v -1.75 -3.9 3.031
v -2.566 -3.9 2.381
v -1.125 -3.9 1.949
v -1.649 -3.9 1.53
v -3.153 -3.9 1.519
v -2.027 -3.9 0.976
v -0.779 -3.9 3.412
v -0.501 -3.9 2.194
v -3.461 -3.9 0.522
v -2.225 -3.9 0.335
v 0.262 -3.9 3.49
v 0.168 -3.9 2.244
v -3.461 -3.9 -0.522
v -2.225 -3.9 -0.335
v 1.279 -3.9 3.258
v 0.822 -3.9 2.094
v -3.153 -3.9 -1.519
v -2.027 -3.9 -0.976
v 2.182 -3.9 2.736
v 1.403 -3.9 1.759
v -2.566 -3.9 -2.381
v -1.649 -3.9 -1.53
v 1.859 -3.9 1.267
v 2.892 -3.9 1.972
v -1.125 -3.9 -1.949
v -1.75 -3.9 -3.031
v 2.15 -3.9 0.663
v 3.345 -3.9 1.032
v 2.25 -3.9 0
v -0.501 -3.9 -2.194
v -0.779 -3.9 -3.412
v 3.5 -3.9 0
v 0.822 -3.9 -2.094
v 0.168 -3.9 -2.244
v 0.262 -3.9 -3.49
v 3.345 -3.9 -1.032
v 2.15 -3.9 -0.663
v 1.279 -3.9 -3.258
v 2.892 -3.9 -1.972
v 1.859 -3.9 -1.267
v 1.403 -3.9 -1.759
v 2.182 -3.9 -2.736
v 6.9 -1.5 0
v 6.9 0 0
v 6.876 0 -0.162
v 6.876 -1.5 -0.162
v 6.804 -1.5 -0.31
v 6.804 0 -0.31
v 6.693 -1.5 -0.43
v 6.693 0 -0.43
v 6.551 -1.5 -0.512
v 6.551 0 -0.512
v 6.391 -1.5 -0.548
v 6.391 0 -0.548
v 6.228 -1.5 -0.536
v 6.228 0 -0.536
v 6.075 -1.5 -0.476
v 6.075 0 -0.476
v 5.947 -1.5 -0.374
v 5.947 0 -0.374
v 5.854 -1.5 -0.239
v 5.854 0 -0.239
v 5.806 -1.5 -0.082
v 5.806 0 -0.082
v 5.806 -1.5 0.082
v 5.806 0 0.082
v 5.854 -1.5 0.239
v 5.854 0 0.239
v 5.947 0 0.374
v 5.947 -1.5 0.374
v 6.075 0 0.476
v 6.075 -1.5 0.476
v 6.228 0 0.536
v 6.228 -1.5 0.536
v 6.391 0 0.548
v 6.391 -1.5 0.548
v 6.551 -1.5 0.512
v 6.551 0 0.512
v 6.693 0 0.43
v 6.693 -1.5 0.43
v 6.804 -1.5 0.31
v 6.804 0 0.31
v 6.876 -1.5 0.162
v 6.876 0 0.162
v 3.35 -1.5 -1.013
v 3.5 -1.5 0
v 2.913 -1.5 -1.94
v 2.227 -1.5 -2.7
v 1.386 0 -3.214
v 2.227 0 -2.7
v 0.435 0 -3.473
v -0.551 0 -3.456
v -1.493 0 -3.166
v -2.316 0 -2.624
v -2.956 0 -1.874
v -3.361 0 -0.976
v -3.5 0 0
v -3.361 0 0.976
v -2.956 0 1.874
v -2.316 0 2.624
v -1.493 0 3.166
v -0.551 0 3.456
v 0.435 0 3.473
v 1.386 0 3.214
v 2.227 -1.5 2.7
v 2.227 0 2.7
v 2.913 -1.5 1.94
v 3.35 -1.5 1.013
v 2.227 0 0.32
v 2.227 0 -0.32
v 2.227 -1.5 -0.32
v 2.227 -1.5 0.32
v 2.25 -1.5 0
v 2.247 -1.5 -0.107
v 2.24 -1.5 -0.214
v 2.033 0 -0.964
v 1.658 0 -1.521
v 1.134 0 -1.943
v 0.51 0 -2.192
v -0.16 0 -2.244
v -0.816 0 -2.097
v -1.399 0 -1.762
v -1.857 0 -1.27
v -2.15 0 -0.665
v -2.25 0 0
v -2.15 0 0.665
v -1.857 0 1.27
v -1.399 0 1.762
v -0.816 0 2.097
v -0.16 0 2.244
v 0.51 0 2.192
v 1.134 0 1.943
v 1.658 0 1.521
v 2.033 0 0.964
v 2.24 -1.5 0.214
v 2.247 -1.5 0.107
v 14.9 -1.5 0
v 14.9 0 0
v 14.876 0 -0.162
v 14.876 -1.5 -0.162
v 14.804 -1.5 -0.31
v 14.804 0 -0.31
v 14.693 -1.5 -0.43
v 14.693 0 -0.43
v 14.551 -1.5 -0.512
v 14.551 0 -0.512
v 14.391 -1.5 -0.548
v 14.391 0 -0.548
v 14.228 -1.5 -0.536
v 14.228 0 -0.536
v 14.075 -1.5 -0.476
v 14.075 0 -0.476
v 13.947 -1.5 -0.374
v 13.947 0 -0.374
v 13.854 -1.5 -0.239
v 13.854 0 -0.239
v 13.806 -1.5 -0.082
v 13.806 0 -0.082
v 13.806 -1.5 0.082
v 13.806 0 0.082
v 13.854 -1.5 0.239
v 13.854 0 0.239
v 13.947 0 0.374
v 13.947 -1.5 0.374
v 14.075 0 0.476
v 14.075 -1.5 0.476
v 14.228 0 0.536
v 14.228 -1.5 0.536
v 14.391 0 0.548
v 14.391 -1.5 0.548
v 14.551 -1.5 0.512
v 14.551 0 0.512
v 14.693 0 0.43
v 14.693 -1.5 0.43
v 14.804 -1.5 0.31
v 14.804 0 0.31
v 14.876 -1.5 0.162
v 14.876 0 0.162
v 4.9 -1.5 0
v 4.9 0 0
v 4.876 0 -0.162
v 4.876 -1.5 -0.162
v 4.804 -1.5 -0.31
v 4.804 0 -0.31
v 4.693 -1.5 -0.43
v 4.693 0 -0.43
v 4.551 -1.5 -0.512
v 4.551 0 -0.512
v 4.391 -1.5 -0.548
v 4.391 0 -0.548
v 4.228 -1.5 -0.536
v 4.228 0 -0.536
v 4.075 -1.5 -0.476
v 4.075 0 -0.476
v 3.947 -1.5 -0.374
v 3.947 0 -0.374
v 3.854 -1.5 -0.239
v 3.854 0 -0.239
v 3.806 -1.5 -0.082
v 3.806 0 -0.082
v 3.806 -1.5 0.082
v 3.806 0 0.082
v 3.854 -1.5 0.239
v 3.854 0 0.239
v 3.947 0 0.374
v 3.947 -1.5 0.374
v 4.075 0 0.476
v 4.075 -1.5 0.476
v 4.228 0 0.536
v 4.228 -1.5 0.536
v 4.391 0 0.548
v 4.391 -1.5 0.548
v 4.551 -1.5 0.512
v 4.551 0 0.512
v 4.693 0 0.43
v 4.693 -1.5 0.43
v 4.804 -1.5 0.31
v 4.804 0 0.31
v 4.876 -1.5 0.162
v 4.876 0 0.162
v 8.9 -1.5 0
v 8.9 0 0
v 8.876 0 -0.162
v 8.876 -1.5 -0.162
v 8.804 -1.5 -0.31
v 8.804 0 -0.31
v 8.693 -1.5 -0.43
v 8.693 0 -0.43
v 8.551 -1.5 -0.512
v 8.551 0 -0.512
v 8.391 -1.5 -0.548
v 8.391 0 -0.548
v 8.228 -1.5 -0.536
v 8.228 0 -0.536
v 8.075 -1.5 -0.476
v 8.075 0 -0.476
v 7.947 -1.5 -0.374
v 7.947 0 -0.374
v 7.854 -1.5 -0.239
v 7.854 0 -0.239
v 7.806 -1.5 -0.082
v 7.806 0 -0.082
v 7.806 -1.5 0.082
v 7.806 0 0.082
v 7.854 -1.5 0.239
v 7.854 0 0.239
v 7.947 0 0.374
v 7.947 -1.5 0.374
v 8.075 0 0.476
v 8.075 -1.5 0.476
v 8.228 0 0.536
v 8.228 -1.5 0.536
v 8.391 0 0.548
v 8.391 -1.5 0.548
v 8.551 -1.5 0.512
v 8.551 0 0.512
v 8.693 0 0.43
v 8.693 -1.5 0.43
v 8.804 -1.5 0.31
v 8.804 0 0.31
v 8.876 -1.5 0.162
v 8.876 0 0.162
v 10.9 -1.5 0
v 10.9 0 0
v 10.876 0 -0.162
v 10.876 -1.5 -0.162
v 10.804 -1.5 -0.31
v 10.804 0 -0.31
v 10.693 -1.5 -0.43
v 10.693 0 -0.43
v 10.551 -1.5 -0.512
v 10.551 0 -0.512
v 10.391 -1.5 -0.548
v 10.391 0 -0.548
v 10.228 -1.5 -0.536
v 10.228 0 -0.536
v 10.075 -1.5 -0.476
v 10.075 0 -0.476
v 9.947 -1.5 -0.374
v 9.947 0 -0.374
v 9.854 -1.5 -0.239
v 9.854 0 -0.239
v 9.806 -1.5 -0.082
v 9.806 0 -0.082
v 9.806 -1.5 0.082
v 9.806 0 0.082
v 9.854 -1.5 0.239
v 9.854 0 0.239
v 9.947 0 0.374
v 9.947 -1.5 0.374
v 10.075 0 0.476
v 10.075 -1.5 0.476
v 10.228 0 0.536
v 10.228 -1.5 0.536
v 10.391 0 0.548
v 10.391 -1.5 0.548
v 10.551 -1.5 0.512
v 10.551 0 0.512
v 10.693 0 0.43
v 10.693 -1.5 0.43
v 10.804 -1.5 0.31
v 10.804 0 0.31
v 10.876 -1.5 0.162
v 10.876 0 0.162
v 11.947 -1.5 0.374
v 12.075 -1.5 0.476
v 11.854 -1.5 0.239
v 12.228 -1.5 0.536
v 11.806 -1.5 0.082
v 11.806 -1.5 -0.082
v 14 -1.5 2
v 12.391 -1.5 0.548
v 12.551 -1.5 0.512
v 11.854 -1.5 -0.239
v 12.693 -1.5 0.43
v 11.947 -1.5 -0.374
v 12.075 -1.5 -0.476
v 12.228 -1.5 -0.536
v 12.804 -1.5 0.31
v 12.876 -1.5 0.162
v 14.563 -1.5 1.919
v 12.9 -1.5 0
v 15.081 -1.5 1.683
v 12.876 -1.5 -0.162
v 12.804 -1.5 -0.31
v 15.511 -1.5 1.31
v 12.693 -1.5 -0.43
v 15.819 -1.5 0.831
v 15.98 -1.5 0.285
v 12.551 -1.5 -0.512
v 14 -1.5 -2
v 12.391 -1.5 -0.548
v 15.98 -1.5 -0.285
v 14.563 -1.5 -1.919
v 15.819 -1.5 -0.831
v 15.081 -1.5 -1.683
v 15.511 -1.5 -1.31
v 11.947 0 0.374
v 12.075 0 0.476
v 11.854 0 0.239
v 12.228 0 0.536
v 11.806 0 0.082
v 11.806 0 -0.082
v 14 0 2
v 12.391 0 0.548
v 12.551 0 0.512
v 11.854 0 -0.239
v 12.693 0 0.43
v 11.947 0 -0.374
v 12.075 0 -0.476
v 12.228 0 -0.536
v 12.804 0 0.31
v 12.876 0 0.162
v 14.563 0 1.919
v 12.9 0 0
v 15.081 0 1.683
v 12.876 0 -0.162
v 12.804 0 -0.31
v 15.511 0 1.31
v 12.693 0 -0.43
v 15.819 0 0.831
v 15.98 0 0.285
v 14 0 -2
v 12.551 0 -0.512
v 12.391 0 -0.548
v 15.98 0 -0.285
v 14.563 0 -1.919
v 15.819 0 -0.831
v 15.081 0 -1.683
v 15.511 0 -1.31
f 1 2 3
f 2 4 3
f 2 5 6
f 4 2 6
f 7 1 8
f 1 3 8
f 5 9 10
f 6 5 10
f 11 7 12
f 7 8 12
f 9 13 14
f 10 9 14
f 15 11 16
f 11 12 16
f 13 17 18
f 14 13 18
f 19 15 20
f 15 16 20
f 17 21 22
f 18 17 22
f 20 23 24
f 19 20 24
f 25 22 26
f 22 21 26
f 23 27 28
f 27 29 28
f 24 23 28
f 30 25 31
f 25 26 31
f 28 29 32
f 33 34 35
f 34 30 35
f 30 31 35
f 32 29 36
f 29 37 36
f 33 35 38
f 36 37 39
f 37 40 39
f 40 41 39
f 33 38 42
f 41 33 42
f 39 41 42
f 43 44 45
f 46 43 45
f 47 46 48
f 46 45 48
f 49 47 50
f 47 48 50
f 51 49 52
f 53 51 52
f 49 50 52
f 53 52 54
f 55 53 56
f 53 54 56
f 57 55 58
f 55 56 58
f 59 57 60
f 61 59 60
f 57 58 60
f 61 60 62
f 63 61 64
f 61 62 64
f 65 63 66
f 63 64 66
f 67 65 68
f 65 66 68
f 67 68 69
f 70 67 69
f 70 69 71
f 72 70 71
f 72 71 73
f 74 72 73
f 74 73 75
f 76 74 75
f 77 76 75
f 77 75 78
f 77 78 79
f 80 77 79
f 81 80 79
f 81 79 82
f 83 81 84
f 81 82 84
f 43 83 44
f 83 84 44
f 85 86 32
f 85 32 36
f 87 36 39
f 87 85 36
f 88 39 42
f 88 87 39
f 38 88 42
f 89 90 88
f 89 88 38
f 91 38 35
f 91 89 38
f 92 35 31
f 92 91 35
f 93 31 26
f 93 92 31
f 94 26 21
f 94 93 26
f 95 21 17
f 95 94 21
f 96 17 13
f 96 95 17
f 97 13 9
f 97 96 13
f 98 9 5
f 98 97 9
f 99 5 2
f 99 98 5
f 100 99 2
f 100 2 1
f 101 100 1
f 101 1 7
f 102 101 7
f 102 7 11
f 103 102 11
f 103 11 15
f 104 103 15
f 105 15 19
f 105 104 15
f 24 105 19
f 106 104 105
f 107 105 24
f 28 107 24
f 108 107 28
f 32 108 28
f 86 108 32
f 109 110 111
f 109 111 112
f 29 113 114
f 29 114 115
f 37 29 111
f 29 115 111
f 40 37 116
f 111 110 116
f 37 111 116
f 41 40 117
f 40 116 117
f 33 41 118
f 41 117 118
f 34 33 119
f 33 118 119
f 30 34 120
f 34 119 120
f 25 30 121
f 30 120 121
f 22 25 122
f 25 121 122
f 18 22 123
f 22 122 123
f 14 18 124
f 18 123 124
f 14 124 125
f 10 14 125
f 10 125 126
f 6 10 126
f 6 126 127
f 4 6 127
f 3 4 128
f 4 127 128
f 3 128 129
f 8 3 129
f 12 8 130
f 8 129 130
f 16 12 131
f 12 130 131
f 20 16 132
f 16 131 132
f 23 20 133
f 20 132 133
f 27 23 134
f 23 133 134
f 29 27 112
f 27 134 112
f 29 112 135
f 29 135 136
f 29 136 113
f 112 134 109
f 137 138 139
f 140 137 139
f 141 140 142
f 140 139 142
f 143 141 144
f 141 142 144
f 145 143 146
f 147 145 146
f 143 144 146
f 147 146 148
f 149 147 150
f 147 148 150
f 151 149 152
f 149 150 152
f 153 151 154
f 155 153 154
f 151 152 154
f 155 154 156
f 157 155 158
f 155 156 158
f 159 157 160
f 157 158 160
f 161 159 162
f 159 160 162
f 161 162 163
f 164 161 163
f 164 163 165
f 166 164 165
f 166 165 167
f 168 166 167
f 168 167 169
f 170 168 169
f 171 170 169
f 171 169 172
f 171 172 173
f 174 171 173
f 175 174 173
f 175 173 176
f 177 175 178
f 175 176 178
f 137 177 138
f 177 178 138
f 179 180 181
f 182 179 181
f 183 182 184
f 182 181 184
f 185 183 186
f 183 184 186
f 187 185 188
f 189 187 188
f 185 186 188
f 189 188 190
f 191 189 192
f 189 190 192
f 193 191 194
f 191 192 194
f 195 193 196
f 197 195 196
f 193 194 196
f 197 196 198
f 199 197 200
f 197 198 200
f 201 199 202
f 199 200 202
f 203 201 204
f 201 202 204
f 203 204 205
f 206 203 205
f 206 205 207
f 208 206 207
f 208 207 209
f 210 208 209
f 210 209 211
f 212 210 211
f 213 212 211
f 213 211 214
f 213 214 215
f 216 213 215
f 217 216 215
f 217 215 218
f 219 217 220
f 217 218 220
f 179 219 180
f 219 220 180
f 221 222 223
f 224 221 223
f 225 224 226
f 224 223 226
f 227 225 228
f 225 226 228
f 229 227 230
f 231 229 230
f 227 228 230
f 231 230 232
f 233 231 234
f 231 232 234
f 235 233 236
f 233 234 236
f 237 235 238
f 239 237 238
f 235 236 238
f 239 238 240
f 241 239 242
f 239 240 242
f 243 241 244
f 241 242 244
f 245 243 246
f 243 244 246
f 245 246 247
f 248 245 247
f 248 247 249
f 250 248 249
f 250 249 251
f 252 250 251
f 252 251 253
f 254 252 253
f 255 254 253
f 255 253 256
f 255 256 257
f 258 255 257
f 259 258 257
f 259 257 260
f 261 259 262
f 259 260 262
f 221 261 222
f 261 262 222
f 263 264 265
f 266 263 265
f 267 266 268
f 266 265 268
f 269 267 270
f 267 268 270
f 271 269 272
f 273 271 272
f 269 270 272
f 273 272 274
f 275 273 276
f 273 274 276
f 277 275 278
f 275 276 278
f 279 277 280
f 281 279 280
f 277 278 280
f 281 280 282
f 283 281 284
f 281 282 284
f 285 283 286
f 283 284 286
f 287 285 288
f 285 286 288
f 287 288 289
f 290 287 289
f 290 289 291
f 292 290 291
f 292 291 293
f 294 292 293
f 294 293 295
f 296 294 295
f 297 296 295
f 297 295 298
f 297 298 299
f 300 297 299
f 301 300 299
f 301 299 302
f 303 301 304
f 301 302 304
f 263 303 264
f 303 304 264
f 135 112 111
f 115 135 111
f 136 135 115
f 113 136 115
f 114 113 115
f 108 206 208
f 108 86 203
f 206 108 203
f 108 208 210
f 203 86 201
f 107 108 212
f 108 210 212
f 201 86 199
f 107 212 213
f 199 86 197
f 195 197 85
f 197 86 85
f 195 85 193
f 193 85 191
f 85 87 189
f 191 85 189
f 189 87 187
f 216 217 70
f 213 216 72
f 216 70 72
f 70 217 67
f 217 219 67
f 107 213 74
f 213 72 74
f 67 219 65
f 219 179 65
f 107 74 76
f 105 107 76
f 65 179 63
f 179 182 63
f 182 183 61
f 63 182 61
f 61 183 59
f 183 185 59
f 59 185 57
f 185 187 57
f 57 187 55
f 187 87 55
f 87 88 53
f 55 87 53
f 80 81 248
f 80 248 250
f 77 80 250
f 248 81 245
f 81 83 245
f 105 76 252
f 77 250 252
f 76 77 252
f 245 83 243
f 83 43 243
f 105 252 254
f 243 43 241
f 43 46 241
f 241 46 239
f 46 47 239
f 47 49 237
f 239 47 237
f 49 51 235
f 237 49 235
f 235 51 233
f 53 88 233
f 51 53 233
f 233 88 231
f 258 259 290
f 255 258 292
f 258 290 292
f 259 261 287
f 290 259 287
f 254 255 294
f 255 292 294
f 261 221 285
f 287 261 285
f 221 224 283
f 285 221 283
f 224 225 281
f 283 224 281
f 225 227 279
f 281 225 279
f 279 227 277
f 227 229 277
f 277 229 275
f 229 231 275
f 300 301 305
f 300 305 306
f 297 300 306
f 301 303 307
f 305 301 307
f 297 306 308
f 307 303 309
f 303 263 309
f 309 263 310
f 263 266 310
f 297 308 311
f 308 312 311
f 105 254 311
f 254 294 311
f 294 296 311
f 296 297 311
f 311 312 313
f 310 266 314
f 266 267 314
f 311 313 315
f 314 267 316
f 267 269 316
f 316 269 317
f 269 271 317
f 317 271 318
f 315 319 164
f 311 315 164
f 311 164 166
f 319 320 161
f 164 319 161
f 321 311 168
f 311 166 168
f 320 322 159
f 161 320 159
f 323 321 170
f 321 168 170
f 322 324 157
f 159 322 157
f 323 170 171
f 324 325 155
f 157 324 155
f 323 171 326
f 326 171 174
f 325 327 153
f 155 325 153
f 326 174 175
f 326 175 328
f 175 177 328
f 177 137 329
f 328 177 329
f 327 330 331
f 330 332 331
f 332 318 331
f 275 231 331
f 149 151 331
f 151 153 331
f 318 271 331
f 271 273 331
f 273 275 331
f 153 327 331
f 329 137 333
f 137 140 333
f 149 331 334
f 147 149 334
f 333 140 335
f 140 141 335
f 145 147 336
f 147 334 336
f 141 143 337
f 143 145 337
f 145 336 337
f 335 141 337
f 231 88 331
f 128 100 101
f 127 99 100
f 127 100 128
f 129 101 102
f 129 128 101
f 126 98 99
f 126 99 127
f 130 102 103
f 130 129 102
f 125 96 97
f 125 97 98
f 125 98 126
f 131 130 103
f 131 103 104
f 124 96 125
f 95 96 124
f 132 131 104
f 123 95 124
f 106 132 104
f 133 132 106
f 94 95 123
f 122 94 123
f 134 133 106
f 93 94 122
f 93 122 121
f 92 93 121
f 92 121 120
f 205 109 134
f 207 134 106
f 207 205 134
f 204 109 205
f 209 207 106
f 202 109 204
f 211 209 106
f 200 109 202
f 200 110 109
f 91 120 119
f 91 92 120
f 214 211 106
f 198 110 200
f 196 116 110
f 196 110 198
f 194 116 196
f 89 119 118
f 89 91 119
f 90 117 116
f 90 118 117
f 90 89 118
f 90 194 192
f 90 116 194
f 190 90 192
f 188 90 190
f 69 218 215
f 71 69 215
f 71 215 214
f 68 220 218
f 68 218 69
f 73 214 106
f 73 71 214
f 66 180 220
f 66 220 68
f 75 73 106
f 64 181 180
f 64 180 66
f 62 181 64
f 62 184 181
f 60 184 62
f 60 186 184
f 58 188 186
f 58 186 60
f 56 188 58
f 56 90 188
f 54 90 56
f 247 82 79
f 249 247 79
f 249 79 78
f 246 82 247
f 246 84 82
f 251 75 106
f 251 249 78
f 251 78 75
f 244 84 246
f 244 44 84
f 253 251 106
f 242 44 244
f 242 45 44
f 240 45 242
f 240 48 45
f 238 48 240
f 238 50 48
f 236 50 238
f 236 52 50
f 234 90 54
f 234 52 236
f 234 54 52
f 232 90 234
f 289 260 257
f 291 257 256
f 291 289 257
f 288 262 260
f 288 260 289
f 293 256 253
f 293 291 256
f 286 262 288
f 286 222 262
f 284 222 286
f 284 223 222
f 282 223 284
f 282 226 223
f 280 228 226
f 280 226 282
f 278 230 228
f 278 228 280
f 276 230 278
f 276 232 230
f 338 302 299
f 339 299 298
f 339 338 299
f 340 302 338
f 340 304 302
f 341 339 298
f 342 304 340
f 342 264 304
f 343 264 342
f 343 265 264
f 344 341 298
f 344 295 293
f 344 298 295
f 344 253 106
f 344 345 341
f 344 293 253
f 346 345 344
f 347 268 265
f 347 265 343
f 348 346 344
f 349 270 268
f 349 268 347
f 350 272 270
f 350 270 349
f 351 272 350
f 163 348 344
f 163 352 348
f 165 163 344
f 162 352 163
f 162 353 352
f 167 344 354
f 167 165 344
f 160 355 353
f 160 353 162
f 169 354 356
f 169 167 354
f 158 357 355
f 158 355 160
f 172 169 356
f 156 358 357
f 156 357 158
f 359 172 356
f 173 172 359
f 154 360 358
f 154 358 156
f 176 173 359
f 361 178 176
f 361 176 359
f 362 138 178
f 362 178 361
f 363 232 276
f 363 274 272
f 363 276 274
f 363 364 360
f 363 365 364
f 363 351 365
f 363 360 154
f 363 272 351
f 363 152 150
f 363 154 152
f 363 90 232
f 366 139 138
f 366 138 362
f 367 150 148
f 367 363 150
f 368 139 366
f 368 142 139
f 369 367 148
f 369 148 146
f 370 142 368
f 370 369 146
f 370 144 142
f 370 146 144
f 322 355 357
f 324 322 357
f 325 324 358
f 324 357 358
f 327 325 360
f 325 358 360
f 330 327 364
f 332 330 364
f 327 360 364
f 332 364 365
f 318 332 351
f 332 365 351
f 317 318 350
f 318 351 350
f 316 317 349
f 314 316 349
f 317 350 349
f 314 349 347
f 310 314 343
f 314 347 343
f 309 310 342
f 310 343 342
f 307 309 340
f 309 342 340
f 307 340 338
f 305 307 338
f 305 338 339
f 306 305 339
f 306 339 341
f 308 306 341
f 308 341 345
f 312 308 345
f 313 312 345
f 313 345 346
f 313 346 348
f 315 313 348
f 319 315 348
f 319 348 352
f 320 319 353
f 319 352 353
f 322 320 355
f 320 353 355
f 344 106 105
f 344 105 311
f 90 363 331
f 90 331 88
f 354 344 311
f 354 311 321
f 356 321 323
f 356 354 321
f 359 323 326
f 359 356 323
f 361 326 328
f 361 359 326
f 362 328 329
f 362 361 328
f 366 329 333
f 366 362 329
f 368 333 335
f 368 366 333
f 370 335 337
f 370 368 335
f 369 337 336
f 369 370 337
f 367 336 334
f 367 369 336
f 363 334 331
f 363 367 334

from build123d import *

# Parameters (mm, degrees)
SKETCH1_R           = 3.5
SKETCH1_R_2         = 2.25
BOSS_EXTRUDE1_DEPTH = 3.9
SKETCH2_R           = 2
BOSS_EXTRUDE2_DEPTH = 1.5
SKETCH3_R           = 0.55
CUT_EXTRUDE1_DEPTH  = 1.5
LPATTERN1_COUNT     = 6
LPATTERN1_PITCH     = 2


with BuildPart() as part:
    # Sketch1 → Boss-Extrude1 (new body)
    with BuildSketch(Plane(origin=(0, 0, 0), x_dir=(1, 0, 0), z_dir=(0, 1, 0))):
        Circle(SKETCH1_R)
        Circle(SKETCH1_R_2, mode=Mode.SUBTRACT)
    extrude(amount=-BOSS_EXTRUDE1_DEPTH)

    # Sketch2 → Boss-Extrude2 (add)
    with BuildSketch(Plane(origin=(0, 0, 0), x_dir=(1, 0, 0), z_dir=(0, 1, 0))):
        with BuildLine():
            ThreePointArc((14, -2), (12, 0), (14, 2))
            Line((14, 2), (2.227105745, 2.7))
            Line((2.227105745, 2.7), (2.227105745, -2.7))
            Line((2.227105745, -2.7), (14, -2))
        make_face()
        with Locations((14, 0)):
            Circle(SKETCH2_R)
    extrude(amount=-BOSS_EXTRUDE2_DEPTH)

    # Sketch3 → Cut-Extrude1 (cut)
    with BuildSketch(Plane(origin=(0, 0, 0), x_dir=(1, 0, 0), z_dir=(0, 1, 0))):
        with Locations((14.35, 0)):
            Circle(SKETCH3_R)
    cut_extrude1 = extrude(amount=-CUT_EXTRUDE1_DEPTH, mode=Mode.SUBTRACT)

    # LPattern1: Cut-Extrude1 ×6
    with Locations(*[(-i * LPATTERN1_PITCH, 0, 0) for i in range(1, LPATTERN1_COUNT)]):
        add(cut_extrude1, mode=Mode.SUBTRACT)


solid = part.part
